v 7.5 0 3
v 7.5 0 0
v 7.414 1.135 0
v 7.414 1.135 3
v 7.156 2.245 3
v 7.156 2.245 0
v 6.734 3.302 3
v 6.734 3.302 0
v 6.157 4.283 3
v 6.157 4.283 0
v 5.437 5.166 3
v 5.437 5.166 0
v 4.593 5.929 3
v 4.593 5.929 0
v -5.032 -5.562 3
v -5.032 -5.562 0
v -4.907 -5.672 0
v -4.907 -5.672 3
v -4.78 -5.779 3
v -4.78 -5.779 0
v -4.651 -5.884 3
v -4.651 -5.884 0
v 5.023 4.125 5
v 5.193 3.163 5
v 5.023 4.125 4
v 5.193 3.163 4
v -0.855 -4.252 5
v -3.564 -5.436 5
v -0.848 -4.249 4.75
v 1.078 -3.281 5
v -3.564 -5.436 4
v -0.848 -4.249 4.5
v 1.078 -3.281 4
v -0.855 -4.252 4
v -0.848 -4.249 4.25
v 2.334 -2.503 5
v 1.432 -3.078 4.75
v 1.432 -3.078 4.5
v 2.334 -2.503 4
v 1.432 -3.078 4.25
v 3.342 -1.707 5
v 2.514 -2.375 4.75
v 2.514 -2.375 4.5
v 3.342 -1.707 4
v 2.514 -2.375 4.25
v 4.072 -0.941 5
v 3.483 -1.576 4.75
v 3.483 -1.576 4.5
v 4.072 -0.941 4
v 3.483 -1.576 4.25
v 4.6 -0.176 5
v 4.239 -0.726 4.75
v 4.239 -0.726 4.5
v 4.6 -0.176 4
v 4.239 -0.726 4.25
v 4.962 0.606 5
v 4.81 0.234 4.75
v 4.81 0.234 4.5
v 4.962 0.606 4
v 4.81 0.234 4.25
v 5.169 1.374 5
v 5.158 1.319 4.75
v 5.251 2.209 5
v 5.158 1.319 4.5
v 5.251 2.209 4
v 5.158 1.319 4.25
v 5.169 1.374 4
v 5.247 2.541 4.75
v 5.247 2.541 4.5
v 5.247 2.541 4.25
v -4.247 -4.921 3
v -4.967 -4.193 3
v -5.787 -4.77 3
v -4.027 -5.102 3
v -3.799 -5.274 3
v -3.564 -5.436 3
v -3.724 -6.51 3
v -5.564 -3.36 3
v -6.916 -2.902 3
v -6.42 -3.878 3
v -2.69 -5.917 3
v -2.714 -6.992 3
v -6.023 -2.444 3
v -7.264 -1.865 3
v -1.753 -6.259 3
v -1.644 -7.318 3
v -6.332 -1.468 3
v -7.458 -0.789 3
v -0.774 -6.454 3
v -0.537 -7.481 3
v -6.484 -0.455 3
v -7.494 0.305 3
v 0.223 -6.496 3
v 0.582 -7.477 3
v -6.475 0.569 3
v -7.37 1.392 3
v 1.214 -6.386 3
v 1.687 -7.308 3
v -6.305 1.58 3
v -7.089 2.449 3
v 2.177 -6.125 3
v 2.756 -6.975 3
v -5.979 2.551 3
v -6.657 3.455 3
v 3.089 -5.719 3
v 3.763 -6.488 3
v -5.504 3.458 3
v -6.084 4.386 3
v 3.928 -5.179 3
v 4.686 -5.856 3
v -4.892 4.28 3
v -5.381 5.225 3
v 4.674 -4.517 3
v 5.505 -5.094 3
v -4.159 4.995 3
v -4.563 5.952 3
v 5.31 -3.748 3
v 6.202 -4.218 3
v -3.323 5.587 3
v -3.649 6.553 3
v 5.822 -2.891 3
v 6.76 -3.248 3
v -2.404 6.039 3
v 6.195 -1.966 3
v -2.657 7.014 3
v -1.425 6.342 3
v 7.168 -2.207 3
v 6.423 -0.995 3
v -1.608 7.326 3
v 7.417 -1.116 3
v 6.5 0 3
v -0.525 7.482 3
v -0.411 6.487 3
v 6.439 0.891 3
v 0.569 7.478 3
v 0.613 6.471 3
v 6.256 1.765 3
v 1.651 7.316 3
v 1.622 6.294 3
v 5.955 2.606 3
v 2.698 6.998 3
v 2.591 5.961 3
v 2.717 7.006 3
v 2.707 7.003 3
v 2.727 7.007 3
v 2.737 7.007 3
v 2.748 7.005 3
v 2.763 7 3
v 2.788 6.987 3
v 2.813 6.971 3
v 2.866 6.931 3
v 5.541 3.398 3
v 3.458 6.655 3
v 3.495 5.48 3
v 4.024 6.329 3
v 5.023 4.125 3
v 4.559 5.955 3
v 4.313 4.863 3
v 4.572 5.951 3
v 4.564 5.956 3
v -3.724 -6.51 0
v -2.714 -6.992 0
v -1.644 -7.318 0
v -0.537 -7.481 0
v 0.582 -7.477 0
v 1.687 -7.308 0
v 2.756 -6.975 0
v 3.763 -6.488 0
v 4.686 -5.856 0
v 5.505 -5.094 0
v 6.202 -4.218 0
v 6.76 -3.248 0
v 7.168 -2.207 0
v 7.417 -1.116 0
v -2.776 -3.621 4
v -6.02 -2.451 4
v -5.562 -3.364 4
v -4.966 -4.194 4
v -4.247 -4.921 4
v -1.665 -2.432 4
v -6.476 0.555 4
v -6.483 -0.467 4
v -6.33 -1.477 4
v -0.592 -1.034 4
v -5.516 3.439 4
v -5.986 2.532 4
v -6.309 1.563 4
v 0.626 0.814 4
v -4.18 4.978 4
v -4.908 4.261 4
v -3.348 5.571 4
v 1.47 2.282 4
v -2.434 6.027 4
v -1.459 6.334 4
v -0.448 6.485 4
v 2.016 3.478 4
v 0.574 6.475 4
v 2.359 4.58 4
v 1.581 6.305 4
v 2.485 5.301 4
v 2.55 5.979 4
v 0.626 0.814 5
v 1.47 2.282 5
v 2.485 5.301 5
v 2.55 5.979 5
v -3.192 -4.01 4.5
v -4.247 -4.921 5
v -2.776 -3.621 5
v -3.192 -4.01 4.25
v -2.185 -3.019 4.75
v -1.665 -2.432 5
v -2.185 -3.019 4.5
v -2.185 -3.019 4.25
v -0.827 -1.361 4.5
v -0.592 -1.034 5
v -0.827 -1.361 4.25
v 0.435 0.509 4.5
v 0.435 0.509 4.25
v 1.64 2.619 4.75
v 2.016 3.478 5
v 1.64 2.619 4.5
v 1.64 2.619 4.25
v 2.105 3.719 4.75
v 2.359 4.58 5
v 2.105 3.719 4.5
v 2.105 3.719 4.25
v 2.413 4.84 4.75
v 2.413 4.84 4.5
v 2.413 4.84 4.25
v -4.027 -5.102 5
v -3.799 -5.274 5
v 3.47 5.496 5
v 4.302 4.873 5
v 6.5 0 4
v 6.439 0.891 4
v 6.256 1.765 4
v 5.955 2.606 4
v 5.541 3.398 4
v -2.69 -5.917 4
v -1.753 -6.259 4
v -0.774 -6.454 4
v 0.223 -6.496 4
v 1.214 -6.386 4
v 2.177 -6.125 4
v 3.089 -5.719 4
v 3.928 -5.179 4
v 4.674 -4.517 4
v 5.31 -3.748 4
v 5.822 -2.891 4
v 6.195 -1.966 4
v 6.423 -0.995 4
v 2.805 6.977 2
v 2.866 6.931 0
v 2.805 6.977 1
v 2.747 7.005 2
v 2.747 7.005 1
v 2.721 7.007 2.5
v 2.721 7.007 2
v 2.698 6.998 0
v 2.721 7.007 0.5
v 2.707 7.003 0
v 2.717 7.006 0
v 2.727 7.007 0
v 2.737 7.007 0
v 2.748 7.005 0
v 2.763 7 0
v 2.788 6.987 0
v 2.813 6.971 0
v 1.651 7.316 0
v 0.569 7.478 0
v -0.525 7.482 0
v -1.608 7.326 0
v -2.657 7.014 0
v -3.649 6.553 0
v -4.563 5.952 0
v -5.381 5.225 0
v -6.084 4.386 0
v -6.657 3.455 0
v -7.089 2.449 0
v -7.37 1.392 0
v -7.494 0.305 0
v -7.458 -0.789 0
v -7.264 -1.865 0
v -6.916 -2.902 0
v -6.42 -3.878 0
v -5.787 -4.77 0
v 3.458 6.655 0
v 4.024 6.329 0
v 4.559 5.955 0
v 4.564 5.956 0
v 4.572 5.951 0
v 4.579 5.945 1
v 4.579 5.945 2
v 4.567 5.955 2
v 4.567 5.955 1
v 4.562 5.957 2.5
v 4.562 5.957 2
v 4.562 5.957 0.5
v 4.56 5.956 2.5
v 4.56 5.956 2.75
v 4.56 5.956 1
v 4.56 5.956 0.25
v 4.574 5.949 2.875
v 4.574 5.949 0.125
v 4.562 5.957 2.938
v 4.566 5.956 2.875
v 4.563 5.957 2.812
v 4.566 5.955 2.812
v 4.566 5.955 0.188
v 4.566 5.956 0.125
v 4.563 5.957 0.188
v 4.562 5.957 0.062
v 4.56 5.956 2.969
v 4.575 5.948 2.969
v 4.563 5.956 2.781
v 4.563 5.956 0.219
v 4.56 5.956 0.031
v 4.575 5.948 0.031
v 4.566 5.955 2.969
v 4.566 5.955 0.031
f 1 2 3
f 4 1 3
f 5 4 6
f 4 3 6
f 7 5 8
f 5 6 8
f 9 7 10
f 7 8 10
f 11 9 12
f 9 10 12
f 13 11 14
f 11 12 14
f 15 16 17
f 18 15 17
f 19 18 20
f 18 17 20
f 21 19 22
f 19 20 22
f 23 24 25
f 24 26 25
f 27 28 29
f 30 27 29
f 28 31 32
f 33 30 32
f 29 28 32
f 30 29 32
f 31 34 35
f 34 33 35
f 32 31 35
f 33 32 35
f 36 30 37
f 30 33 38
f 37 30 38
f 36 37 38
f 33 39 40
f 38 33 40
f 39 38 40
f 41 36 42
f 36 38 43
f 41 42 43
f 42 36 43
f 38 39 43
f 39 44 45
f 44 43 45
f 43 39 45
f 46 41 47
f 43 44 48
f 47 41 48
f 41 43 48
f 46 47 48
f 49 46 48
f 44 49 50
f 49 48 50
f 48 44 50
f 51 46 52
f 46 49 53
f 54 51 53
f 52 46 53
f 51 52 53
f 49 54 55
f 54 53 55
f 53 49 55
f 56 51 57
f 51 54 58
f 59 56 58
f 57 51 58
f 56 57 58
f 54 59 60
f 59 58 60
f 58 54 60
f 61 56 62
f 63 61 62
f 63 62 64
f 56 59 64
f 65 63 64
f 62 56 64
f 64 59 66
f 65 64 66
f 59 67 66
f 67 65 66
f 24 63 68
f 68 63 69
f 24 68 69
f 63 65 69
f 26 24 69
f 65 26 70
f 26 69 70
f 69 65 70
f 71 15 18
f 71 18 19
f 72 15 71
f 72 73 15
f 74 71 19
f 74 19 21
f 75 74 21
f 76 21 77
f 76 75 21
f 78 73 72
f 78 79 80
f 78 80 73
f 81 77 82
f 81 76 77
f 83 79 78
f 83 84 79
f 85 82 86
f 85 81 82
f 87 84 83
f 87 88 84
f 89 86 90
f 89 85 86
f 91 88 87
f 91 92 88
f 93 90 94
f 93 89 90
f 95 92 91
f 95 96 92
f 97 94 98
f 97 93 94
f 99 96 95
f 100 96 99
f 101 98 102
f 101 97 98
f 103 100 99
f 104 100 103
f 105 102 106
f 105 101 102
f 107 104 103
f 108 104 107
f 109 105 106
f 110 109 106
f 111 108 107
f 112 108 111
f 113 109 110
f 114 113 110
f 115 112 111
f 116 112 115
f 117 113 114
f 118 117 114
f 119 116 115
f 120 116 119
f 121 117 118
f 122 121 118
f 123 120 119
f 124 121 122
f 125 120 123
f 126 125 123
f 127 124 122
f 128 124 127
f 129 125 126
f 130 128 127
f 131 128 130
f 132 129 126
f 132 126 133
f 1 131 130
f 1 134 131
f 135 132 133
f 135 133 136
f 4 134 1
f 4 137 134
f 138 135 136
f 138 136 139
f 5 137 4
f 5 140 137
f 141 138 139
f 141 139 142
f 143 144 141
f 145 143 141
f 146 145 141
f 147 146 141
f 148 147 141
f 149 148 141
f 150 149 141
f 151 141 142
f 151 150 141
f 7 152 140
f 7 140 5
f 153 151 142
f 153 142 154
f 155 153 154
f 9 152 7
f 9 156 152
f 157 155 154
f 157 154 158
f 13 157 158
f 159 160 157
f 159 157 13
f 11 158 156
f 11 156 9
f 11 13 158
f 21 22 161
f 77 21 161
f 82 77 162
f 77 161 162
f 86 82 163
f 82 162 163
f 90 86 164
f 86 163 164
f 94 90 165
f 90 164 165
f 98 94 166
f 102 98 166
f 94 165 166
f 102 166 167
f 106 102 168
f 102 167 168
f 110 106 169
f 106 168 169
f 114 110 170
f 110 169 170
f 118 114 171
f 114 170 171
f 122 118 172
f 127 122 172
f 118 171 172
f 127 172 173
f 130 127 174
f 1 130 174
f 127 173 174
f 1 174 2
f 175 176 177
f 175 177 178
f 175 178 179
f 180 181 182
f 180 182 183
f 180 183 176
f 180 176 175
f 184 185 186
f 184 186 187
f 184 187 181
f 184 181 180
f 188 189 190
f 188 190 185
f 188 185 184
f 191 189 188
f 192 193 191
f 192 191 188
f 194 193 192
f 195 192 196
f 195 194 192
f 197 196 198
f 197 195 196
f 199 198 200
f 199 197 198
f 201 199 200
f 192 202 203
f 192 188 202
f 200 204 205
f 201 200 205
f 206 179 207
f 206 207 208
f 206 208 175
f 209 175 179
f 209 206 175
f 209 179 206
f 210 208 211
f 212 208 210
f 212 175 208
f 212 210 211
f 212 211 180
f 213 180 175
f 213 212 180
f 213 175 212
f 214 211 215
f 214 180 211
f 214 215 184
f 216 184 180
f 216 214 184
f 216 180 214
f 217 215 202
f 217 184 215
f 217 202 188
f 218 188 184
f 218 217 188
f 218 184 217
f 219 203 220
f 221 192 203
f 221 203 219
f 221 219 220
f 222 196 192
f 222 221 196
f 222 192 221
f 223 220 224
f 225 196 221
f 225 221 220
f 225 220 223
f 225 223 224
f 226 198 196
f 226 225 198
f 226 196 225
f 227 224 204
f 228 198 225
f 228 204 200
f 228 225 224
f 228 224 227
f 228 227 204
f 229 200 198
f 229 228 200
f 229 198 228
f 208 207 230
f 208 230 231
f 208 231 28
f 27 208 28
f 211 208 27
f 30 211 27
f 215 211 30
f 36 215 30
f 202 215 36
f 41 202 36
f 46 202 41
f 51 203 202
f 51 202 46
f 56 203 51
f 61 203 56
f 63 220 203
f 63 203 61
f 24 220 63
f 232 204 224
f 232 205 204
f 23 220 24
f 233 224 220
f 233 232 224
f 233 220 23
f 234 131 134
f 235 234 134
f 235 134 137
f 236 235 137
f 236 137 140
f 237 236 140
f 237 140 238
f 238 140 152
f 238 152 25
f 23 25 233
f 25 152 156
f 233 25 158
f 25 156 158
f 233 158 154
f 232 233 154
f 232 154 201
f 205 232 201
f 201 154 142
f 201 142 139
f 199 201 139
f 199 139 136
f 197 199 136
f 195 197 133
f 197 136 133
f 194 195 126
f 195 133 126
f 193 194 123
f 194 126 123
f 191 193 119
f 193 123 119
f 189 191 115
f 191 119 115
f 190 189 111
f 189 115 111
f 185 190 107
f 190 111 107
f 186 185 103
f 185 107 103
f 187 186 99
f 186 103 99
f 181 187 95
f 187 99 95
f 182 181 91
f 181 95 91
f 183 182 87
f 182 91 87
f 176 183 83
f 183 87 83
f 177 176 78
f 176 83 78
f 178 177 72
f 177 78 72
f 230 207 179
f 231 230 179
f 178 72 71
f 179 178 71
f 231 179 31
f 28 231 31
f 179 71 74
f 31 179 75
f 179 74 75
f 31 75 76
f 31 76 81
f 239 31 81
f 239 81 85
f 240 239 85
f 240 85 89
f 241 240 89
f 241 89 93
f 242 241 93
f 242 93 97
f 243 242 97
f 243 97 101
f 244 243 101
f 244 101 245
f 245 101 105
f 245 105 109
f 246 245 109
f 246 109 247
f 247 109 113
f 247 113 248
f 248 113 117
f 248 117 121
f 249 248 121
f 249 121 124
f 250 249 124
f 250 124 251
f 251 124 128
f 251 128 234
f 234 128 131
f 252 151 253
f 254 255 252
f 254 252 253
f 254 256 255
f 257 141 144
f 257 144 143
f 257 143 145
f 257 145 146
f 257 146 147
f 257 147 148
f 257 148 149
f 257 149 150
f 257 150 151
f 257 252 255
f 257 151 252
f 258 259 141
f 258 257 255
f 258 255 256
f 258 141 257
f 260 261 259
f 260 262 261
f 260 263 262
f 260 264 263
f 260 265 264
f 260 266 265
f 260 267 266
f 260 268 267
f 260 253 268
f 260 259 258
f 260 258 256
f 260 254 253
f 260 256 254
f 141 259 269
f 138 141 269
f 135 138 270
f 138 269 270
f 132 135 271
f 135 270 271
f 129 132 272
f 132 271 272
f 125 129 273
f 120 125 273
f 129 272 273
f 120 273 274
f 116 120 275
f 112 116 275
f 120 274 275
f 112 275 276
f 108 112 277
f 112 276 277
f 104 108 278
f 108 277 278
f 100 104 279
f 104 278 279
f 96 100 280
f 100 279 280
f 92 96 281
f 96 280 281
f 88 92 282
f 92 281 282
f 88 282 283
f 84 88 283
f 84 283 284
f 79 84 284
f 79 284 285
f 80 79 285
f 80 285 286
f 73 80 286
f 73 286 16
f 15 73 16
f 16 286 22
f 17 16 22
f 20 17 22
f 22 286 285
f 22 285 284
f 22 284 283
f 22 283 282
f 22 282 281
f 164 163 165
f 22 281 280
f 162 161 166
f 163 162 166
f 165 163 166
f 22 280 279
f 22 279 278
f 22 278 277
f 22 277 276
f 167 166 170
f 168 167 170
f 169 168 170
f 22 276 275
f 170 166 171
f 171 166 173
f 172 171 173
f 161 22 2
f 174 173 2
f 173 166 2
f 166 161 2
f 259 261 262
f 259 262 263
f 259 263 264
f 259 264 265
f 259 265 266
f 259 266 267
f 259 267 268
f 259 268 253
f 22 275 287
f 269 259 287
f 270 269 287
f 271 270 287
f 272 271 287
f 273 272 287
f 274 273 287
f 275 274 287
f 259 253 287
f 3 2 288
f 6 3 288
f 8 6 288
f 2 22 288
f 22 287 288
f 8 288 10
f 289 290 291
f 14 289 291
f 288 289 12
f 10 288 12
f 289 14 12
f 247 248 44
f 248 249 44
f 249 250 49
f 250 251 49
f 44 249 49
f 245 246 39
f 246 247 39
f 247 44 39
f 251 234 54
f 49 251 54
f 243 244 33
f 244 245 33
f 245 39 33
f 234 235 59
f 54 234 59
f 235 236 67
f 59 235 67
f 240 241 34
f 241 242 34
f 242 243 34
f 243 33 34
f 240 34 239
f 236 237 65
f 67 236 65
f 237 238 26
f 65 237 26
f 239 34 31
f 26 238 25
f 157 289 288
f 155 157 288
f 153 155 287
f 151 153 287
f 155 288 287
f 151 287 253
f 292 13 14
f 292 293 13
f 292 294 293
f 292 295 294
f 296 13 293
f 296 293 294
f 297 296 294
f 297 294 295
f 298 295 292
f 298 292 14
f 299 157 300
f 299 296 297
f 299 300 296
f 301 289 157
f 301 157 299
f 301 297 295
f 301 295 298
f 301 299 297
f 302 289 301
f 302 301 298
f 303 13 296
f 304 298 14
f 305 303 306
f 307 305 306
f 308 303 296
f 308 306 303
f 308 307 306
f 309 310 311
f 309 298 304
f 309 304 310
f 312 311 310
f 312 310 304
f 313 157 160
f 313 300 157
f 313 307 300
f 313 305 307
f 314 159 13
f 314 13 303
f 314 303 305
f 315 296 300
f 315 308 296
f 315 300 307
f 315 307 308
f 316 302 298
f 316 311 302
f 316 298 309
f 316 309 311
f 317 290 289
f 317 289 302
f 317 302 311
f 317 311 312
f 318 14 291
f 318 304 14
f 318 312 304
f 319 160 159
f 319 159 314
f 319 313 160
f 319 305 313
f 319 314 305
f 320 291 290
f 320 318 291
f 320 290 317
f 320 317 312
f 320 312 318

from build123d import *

# Parameters (mm, degrees)
F1_DEPTH = 3
F2_DEPTH = 4
F3_DEPTH = 5


with BuildPart() as f1:
    # F0 (on Top) → F1 (new body)
    with BuildSketch(Plane.XY):
        with BuildLine():
            ThreePointArc((-4.6512770507, -5.8835042107), (3.2684416868, -6.750354727), (7.5, 0))
            ThreePointArc((7.5, 0), (6.7340096327, 3.3019864123), (4.5925028622, 5.9294955486))
            ThreePointArc((4.5925028622, 5.9294955486), (4.5757009883, 5.9424709057), (4.5588624549, 5.9553986531))
            add(Edge.make_bspline(
                [(5.023105082, 4.1253382086), (4.8092727011, 5.1100586092), (4.527040183, 5.9204651186), (4.5588624549, 5.9553986531)],
                knots=[0.8306208955, 0.8306208955, 0.8306208955, 0.8306208955, 0.9756992936, 0.9756992936, 0.9756992936, 0.9756992936], degree=3))
            ThreePointArc((5.023105082, 4.1253382086), (6.1196479896, 2.1908693443), (6.5, 0))
            ThreePointArc((6.5, 0), (3.0889160794, -5.7191430699), (-3.5641838321, -5.4356778428))
            add(Edge.make_bspline(
                [(-4.6512770507, -5.8835042107), (-4.2900632598, -5.7354905481), (-3.928715743, -5.5872181197), (-3.5641838321, -5.4356778428)],
                knots=[0, 0, 0, 0, 0.0706710697, 0.0706710697, 0.0706710697, 0.0706710697], degree=3))
        make_face()
        with BuildLine():
            ThreePointArc((4.5588624549, 5.9553986531), (4.5757009883, 5.9424709057), (4.5925028622, 5.9294955486))
            add(Edge.make_bspline(
                [(4.5588624549, 5.9553986531), (4.5641927018, 5.9612500381), (4.5783342026, 5.9453444257), (4.5925028622, 5.9294955486)],
                knots=[0.9756992936, 0.9756992936, 0.9756992936, 0.9756992936, 1, 1, 1, 1], degree=3))
        make_face()
        with BuildLine():
            ThreePointArc((-5.0316628164, -5.5616876308), (-4.8441431229, -5.7257556187), (-4.6512770507, -5.8835042107))
            add(Edge.make_bspline(
                [(-4.6512770507, -5.8835042107), (-4.2900632598, -5.7354905481), (-3.928715743, -5.5872181197), (-3.5641838321, -5.4356778428)],
                knots=[0, 0, 0, 0, 0.0706710697, 0.0706710697, 0.0706710697, 0.0706710697], degree=3))
            ThreePointArc((-3.5641838321, -5.4356778428), (-3.9139668667, -5.1894954828), (-4.2468013663, -4.920841204))
            add(Edge.make_bspline(
                [(-5.0316628164, -5.5616876308), (-4.7695889387, -5.3492466161), (-4.5073526376, -5.1366155732), (-4.2468013663, -4.920841204)],
                knots=[0, 0, 0, 0, 0.0643179691, 0.0643179691, 0.0643179691, 0.0643179691], degree=3))
        make_face()
        with BuildLine():
            add(Edge.make_bspline(
                [(5.023105082, 4.1253382086), (4.8092727011, 5.1100586092), (4.527040183, 5.9204651186), (4.5588624549, 5.9553986531)],
                knots=[0.8306208955, 0.8306208955, 0.8306208955, 0.8306208955, 0.9756992936, 0.9756992936, 0.9756992936, 0.9756992936], degree=3))
            ThreePointArc((4.5588624549, 5.9553986531), (3.7441973902, 6.4985372125), (2.8657193097, 6.9309200571))
            ThreePointArc((2.8657193097, 6.9309200571), (2.7819893161, 6.9649504984), (2.6978553142, 6.99796947))
            add(Edge.make_bspline(
                [(2.5499079288, 5.9789605748), (2.5902453757, 6.5226766795), (2.603911247, 6.9348960376), (2.6978553142, 6.99796947)],
                knots=[0.8367623992, 0.8367623992, 0.8367623992, 0.8367623992, 0.947721835, 0.947721835, 0.947721835, 0.947721835], degree=3))
            ThreePointArc((2.5499079288, 5.9789605748), (3.8982830175, 5.2012872941), (5.023105082, 4.1253382086))
        make_face()
        with BuildLine():
            ThreePointArc((2.6978553142, 6.99796947), (-6.3873242431, 3.9309145263), (-5.0316628164, -5.5616876308))
            add(Edge.make_bspline(
                [(-5.0316628164, -5.5616876308), (-4.7695889387, -5.3492466161), (-4.5073526376, -5.1366155732), (-4.2468013663, -4.920841204)],
                knots=[0, 0, 0, 0, 0.0643179691, 0.0643179691, 0.0643179691, 0.0643179691], degree=3))
            ThreePointArc((-4.2468013663, -4.920841204), (-5.5155490696, 3.4392904008), (2.5499079288, 5.9789605748))
            add(Edge.make_bspline(
                [(2.5499079288, 5.9789605748), (2.5902453757, 6.5226766795), (2.603911247, 6.9348960376), (2.6978553142, 6.99796947)],
                knots=[0.8367623992, 0.8367623992, 0.8367623992, 0.8367623992, 0.947721835, 0.947721835, 0.947721835, 0.947721835], degree=3))
        make_face()
        with BuildLine():
            ThreePointArc((2.6978553142, 6.99796947), (2.7819893161, 6.9649504984), (2.8657193097, 6.9309200571))
            add(Edge.make_bspline(
                [(2.6978553142, 6.99796947), (2.7421167455, 7.0276863056), (2.8041982628, 6.9799000242), (2.8657193097, 6.9309200571)],
                knots=[0.947721835, 0.947721835, 0.947721835, 0.947721835, 1, 1, 1, 1], degree=3))
        make_face()
    extrude(amount=F1_DEPTH)

    # F0 (on Top) → F2 (join)
    with BuildSketch(Plane.XY):
        with BuildLine():
            ThreePointArc((2.5499079288, 5.9789605748), (-5.5155490696, 3.4392904008), (-4.2468013663, -4.920841204))
            add(Edge.make_bspline(
                [(-4.2468013663, -4.920841204), (-3.5341805064, -4.3306874282), (-1.8083867278, -2.8177742323), (0.4891946402, 0.4568857751), (2.3494442904, 3.7188761281), (2.5242955811, 5.6337268784), (2.5499079288, 5.9789605748)],
                knots=[0.0643179691, 0.0643179691, 0.0643179691, 0.0643179691, 0.2402308565, 0.4980071555, 0.7663084696, 0.8367623992, 0.8367623992, 0.8367623992, 0.8367623992], degree=3))
        make_face()
        with BuildLine():
            add(Edge.make_bspline(
                [(-3.5641838321, -5.4356778428), (-2.691011307, -5.0726895768), (-0.3985062942, -4.0909828194), (3.8347343504, -1.9210278531), (5.5329932743, 1.2110813852), (5.1336844397, 3.6161087413), (5.023105082, 4.1253382086)],
                knots=[0.0706710697, 0.0706710697, 0.0706710697, 0.0706710697, 0.239951274, 0.5060052495, 0.7555963551, 0.8306208955, 0.8306208955, 0.8306208955, 0.8306208955], degree=3))
            ThreePointArc((-3.5641838321, -5.4356778428), (3.0889160794, -5.7191430699), (6.5, 0))
            ThreePointArc((6.5, 0), (6.1196479896, 2.1908693443), (5.023105082, 4.1253382086))
        make_face()
    extrude(amount=F2_DEPTH)

    # F0 (on Top) → F3 (join)
    with BuildSketch(Plane.XY):
        with BuildLine():
            ThreePointArc((-4.2468013663, -4.920841204), (-3.9139668667, -5.1894954828), (-3.5641838321, -5.4356778428))
            add(Edge.make_bspline(
                [(-3.5641838321, -5.4356778428), (-2.691011307, -5.0726895768), (-0.3985062942, -4.0909828194), (3.8347343504, -1.9210278531), (5.5329932743, 1.2110813852), (5.1336844397, 3.6161087413), (5.023105082, 4.1253382086)],
                knots=[0.0706710697, 0.0706710697, 0.0706710697, 0.0706710697, 0.239951274, 0.5060052495, 0.7555963551, 0.8306208955, 0.8306208955, 0.8306208955, 0.8306208955], degree=3))
            ThreePointArc((5.023105082, 4.1253382086), (3.8982830175, 5.2012872941), (2.5499079288, 5.9789605748))
            add(Edge.make_bspline(
                [(-4.2468013663, -4.920841204), (-3.5341805064, -4.3306874282), (-1.8083867278, -2.8177742323), (0.4891946402, 0.4568857751), (2.3494442904, 3.7188761281), (2.5242955811, 5.6337268784), (2.5499079288, 5.9789605748)],
                knots=[0.0643179691, 0.0643179691, 0.0643179691, 0.0643179691, 0.2402308565, 0.4980071555, 0.7663084696, 0.8367623992, 0.8367623992, 0.8367623992, 0.8367623992], degree=3))
        make_face()
    extrude(amount=F3_DEPTH)


solid = f1.part
